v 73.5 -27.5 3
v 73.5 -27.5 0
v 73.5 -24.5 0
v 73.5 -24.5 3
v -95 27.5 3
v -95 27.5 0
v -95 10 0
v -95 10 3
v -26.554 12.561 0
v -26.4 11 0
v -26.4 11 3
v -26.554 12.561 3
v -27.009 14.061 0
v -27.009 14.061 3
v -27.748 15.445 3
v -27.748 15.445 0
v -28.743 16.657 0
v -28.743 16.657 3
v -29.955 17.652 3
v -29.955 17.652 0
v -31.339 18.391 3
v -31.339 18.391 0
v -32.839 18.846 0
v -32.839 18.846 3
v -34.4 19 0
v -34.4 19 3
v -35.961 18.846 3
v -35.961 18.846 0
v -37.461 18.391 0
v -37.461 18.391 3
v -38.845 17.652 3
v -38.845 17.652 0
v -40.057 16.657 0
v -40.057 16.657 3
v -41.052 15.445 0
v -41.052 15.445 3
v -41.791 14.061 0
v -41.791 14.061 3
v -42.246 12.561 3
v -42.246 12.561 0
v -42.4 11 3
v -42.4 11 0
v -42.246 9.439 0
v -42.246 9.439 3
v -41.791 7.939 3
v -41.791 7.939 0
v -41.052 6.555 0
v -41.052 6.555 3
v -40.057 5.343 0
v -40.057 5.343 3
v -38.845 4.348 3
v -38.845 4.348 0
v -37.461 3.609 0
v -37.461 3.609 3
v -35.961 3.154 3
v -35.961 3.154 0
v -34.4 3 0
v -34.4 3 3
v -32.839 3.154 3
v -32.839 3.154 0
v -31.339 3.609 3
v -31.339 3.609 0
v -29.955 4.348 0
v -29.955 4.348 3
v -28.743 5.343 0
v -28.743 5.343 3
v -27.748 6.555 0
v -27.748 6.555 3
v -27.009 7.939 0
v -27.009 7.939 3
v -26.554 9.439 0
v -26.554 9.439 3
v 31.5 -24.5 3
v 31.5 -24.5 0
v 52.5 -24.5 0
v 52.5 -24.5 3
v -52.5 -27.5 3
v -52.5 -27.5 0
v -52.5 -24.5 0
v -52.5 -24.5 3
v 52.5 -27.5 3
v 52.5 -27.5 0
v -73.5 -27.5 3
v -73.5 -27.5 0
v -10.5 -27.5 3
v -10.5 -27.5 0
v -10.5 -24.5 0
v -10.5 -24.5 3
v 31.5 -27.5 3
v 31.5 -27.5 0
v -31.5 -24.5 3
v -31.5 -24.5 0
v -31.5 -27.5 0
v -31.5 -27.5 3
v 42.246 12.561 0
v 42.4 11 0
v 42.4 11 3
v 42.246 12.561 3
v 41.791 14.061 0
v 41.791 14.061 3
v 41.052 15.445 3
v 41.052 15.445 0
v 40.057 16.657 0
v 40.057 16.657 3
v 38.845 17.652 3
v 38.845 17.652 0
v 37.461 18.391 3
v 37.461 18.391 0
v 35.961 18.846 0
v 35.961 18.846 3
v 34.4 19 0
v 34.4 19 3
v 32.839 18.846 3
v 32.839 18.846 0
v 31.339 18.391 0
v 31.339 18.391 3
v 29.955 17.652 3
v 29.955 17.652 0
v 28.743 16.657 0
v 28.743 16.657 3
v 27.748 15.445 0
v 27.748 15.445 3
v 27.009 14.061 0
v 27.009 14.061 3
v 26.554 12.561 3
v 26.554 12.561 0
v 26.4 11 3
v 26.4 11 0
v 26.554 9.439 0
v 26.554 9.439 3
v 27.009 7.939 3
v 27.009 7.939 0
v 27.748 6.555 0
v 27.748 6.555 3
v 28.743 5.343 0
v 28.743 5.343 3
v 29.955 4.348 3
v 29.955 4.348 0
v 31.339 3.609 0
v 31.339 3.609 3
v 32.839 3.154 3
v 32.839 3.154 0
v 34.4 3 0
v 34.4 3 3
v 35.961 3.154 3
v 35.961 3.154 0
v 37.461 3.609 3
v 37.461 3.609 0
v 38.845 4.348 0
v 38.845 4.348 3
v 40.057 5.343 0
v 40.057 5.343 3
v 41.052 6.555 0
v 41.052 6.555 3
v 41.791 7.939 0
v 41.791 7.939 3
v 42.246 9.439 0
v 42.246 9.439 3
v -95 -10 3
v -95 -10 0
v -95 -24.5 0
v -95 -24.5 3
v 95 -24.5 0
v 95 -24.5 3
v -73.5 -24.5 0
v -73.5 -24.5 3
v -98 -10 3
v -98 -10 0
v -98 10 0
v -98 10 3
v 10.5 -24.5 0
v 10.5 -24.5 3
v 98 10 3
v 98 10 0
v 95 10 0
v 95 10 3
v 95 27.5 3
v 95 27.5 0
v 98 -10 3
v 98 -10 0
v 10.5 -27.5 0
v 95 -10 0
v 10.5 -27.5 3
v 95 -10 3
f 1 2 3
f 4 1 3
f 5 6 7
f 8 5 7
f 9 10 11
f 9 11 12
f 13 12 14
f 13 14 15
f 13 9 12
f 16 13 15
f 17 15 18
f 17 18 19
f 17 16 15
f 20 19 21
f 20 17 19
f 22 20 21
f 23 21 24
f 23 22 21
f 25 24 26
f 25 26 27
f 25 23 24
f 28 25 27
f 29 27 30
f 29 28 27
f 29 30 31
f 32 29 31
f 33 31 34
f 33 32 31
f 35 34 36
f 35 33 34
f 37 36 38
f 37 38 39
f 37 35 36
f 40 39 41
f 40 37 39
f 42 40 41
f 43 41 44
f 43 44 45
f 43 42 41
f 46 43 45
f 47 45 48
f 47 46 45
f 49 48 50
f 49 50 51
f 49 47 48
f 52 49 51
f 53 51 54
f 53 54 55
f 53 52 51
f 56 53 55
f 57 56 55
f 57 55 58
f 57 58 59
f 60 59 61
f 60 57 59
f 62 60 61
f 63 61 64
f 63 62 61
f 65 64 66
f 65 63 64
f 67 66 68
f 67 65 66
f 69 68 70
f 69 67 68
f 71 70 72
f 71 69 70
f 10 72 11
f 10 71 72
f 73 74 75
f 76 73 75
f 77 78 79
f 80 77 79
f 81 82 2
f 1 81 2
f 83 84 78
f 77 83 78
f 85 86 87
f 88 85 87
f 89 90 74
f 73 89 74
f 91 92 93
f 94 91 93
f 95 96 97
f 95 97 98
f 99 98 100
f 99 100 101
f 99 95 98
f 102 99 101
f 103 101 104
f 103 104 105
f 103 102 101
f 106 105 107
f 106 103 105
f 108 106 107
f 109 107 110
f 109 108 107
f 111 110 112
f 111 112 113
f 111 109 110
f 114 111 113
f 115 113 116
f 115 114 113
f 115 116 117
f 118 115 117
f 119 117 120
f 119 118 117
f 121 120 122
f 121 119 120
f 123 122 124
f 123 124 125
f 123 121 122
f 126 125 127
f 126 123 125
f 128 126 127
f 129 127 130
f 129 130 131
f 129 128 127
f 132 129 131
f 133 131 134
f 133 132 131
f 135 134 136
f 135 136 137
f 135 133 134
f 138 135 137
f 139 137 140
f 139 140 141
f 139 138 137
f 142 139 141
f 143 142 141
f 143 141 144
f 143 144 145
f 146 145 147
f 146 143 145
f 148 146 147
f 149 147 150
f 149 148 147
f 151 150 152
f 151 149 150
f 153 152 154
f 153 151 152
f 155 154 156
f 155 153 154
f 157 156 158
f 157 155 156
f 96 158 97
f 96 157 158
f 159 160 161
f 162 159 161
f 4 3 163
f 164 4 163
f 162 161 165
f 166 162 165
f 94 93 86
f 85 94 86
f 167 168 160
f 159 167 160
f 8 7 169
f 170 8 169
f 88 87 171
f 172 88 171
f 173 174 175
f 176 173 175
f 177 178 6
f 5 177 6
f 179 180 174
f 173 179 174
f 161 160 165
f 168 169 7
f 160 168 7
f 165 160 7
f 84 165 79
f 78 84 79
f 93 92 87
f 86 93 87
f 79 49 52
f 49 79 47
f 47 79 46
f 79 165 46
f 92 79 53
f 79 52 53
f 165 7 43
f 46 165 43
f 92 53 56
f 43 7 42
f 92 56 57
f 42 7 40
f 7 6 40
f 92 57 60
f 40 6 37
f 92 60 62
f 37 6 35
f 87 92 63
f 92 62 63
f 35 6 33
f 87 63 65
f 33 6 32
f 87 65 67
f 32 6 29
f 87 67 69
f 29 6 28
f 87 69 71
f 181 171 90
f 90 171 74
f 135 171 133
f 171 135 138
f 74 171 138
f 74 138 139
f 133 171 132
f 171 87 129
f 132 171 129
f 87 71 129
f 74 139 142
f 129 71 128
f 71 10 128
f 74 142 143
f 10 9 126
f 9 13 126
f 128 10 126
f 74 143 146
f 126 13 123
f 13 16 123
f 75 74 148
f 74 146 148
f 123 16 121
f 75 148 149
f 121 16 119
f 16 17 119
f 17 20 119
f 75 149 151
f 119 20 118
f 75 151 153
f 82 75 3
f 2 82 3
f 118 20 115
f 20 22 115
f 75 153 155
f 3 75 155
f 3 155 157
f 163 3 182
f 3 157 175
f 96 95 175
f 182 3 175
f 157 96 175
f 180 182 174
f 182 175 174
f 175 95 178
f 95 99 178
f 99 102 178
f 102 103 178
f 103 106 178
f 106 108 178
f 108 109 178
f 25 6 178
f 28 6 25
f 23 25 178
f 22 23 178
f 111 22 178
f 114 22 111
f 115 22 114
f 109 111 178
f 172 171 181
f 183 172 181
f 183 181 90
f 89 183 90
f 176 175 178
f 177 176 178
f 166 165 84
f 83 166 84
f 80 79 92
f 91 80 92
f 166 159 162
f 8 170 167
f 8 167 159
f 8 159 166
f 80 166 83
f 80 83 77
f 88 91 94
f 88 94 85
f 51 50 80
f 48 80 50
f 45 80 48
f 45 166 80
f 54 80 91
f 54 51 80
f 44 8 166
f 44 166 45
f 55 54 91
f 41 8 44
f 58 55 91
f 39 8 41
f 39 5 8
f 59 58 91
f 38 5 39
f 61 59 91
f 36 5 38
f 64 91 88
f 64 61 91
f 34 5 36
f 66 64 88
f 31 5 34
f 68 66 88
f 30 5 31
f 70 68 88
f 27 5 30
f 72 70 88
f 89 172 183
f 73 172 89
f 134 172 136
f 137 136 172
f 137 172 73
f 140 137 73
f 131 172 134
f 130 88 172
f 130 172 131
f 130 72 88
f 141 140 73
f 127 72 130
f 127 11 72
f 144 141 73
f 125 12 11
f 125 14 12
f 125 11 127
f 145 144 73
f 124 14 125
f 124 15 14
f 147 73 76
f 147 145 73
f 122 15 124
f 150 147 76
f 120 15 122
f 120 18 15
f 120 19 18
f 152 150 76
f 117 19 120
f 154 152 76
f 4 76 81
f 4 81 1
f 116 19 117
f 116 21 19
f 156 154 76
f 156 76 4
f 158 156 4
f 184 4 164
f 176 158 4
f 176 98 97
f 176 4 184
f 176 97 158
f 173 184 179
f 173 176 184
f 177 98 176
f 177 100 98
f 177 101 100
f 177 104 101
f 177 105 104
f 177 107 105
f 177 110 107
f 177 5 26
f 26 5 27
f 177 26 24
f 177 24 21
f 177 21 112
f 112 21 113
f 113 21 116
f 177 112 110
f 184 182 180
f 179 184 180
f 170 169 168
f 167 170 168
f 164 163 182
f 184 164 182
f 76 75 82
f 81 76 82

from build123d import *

# Parameters (mm, degrees)
SKETCH1_R           = 8
BOSS_EXTRUDE1_DEPTH = 3


with BuildPart() as part:
    # Sketch1 → Boss-Extrude1 (new body)
    with BuildSketch(Plane.XY):
        Polygon((-10.5, -24.5), (0, -24.5), (10.5, -24.5), (10.5, -27.5), (31.5, -27.5), (31.5, -24.5), (52.5, -24.5), (52.5, -27.5), (73.5, -27.5), (73.5, -24.5), (95, -24.5), (95, -10), (98, -10), (98, 10), (95, 10), (95, 27.5), (-95, 27.5), (-95, 10), (-98, 10), (-98, -10), (-95, -10), (-95, -24.5), (-73.5, -24.5), (-73.5, -27.5), (-52.5, -27.5), (-52.5, -24.5), (-31.5, -24.5), (-31.5, -27.5), (-10.5, -27.5), align=None)
        with Locations((-34.4, 11)):
            Circle(SKETCH1_R, mode=Mode.SUBTRACT)
        with Locations((34.4, 11)):
            Circle(SKETCH1_R, mode=Mode.SUBTRACT)
    extrude(amount=BOSS_EXTRUDE1_DEPTH)


solid = part.part
